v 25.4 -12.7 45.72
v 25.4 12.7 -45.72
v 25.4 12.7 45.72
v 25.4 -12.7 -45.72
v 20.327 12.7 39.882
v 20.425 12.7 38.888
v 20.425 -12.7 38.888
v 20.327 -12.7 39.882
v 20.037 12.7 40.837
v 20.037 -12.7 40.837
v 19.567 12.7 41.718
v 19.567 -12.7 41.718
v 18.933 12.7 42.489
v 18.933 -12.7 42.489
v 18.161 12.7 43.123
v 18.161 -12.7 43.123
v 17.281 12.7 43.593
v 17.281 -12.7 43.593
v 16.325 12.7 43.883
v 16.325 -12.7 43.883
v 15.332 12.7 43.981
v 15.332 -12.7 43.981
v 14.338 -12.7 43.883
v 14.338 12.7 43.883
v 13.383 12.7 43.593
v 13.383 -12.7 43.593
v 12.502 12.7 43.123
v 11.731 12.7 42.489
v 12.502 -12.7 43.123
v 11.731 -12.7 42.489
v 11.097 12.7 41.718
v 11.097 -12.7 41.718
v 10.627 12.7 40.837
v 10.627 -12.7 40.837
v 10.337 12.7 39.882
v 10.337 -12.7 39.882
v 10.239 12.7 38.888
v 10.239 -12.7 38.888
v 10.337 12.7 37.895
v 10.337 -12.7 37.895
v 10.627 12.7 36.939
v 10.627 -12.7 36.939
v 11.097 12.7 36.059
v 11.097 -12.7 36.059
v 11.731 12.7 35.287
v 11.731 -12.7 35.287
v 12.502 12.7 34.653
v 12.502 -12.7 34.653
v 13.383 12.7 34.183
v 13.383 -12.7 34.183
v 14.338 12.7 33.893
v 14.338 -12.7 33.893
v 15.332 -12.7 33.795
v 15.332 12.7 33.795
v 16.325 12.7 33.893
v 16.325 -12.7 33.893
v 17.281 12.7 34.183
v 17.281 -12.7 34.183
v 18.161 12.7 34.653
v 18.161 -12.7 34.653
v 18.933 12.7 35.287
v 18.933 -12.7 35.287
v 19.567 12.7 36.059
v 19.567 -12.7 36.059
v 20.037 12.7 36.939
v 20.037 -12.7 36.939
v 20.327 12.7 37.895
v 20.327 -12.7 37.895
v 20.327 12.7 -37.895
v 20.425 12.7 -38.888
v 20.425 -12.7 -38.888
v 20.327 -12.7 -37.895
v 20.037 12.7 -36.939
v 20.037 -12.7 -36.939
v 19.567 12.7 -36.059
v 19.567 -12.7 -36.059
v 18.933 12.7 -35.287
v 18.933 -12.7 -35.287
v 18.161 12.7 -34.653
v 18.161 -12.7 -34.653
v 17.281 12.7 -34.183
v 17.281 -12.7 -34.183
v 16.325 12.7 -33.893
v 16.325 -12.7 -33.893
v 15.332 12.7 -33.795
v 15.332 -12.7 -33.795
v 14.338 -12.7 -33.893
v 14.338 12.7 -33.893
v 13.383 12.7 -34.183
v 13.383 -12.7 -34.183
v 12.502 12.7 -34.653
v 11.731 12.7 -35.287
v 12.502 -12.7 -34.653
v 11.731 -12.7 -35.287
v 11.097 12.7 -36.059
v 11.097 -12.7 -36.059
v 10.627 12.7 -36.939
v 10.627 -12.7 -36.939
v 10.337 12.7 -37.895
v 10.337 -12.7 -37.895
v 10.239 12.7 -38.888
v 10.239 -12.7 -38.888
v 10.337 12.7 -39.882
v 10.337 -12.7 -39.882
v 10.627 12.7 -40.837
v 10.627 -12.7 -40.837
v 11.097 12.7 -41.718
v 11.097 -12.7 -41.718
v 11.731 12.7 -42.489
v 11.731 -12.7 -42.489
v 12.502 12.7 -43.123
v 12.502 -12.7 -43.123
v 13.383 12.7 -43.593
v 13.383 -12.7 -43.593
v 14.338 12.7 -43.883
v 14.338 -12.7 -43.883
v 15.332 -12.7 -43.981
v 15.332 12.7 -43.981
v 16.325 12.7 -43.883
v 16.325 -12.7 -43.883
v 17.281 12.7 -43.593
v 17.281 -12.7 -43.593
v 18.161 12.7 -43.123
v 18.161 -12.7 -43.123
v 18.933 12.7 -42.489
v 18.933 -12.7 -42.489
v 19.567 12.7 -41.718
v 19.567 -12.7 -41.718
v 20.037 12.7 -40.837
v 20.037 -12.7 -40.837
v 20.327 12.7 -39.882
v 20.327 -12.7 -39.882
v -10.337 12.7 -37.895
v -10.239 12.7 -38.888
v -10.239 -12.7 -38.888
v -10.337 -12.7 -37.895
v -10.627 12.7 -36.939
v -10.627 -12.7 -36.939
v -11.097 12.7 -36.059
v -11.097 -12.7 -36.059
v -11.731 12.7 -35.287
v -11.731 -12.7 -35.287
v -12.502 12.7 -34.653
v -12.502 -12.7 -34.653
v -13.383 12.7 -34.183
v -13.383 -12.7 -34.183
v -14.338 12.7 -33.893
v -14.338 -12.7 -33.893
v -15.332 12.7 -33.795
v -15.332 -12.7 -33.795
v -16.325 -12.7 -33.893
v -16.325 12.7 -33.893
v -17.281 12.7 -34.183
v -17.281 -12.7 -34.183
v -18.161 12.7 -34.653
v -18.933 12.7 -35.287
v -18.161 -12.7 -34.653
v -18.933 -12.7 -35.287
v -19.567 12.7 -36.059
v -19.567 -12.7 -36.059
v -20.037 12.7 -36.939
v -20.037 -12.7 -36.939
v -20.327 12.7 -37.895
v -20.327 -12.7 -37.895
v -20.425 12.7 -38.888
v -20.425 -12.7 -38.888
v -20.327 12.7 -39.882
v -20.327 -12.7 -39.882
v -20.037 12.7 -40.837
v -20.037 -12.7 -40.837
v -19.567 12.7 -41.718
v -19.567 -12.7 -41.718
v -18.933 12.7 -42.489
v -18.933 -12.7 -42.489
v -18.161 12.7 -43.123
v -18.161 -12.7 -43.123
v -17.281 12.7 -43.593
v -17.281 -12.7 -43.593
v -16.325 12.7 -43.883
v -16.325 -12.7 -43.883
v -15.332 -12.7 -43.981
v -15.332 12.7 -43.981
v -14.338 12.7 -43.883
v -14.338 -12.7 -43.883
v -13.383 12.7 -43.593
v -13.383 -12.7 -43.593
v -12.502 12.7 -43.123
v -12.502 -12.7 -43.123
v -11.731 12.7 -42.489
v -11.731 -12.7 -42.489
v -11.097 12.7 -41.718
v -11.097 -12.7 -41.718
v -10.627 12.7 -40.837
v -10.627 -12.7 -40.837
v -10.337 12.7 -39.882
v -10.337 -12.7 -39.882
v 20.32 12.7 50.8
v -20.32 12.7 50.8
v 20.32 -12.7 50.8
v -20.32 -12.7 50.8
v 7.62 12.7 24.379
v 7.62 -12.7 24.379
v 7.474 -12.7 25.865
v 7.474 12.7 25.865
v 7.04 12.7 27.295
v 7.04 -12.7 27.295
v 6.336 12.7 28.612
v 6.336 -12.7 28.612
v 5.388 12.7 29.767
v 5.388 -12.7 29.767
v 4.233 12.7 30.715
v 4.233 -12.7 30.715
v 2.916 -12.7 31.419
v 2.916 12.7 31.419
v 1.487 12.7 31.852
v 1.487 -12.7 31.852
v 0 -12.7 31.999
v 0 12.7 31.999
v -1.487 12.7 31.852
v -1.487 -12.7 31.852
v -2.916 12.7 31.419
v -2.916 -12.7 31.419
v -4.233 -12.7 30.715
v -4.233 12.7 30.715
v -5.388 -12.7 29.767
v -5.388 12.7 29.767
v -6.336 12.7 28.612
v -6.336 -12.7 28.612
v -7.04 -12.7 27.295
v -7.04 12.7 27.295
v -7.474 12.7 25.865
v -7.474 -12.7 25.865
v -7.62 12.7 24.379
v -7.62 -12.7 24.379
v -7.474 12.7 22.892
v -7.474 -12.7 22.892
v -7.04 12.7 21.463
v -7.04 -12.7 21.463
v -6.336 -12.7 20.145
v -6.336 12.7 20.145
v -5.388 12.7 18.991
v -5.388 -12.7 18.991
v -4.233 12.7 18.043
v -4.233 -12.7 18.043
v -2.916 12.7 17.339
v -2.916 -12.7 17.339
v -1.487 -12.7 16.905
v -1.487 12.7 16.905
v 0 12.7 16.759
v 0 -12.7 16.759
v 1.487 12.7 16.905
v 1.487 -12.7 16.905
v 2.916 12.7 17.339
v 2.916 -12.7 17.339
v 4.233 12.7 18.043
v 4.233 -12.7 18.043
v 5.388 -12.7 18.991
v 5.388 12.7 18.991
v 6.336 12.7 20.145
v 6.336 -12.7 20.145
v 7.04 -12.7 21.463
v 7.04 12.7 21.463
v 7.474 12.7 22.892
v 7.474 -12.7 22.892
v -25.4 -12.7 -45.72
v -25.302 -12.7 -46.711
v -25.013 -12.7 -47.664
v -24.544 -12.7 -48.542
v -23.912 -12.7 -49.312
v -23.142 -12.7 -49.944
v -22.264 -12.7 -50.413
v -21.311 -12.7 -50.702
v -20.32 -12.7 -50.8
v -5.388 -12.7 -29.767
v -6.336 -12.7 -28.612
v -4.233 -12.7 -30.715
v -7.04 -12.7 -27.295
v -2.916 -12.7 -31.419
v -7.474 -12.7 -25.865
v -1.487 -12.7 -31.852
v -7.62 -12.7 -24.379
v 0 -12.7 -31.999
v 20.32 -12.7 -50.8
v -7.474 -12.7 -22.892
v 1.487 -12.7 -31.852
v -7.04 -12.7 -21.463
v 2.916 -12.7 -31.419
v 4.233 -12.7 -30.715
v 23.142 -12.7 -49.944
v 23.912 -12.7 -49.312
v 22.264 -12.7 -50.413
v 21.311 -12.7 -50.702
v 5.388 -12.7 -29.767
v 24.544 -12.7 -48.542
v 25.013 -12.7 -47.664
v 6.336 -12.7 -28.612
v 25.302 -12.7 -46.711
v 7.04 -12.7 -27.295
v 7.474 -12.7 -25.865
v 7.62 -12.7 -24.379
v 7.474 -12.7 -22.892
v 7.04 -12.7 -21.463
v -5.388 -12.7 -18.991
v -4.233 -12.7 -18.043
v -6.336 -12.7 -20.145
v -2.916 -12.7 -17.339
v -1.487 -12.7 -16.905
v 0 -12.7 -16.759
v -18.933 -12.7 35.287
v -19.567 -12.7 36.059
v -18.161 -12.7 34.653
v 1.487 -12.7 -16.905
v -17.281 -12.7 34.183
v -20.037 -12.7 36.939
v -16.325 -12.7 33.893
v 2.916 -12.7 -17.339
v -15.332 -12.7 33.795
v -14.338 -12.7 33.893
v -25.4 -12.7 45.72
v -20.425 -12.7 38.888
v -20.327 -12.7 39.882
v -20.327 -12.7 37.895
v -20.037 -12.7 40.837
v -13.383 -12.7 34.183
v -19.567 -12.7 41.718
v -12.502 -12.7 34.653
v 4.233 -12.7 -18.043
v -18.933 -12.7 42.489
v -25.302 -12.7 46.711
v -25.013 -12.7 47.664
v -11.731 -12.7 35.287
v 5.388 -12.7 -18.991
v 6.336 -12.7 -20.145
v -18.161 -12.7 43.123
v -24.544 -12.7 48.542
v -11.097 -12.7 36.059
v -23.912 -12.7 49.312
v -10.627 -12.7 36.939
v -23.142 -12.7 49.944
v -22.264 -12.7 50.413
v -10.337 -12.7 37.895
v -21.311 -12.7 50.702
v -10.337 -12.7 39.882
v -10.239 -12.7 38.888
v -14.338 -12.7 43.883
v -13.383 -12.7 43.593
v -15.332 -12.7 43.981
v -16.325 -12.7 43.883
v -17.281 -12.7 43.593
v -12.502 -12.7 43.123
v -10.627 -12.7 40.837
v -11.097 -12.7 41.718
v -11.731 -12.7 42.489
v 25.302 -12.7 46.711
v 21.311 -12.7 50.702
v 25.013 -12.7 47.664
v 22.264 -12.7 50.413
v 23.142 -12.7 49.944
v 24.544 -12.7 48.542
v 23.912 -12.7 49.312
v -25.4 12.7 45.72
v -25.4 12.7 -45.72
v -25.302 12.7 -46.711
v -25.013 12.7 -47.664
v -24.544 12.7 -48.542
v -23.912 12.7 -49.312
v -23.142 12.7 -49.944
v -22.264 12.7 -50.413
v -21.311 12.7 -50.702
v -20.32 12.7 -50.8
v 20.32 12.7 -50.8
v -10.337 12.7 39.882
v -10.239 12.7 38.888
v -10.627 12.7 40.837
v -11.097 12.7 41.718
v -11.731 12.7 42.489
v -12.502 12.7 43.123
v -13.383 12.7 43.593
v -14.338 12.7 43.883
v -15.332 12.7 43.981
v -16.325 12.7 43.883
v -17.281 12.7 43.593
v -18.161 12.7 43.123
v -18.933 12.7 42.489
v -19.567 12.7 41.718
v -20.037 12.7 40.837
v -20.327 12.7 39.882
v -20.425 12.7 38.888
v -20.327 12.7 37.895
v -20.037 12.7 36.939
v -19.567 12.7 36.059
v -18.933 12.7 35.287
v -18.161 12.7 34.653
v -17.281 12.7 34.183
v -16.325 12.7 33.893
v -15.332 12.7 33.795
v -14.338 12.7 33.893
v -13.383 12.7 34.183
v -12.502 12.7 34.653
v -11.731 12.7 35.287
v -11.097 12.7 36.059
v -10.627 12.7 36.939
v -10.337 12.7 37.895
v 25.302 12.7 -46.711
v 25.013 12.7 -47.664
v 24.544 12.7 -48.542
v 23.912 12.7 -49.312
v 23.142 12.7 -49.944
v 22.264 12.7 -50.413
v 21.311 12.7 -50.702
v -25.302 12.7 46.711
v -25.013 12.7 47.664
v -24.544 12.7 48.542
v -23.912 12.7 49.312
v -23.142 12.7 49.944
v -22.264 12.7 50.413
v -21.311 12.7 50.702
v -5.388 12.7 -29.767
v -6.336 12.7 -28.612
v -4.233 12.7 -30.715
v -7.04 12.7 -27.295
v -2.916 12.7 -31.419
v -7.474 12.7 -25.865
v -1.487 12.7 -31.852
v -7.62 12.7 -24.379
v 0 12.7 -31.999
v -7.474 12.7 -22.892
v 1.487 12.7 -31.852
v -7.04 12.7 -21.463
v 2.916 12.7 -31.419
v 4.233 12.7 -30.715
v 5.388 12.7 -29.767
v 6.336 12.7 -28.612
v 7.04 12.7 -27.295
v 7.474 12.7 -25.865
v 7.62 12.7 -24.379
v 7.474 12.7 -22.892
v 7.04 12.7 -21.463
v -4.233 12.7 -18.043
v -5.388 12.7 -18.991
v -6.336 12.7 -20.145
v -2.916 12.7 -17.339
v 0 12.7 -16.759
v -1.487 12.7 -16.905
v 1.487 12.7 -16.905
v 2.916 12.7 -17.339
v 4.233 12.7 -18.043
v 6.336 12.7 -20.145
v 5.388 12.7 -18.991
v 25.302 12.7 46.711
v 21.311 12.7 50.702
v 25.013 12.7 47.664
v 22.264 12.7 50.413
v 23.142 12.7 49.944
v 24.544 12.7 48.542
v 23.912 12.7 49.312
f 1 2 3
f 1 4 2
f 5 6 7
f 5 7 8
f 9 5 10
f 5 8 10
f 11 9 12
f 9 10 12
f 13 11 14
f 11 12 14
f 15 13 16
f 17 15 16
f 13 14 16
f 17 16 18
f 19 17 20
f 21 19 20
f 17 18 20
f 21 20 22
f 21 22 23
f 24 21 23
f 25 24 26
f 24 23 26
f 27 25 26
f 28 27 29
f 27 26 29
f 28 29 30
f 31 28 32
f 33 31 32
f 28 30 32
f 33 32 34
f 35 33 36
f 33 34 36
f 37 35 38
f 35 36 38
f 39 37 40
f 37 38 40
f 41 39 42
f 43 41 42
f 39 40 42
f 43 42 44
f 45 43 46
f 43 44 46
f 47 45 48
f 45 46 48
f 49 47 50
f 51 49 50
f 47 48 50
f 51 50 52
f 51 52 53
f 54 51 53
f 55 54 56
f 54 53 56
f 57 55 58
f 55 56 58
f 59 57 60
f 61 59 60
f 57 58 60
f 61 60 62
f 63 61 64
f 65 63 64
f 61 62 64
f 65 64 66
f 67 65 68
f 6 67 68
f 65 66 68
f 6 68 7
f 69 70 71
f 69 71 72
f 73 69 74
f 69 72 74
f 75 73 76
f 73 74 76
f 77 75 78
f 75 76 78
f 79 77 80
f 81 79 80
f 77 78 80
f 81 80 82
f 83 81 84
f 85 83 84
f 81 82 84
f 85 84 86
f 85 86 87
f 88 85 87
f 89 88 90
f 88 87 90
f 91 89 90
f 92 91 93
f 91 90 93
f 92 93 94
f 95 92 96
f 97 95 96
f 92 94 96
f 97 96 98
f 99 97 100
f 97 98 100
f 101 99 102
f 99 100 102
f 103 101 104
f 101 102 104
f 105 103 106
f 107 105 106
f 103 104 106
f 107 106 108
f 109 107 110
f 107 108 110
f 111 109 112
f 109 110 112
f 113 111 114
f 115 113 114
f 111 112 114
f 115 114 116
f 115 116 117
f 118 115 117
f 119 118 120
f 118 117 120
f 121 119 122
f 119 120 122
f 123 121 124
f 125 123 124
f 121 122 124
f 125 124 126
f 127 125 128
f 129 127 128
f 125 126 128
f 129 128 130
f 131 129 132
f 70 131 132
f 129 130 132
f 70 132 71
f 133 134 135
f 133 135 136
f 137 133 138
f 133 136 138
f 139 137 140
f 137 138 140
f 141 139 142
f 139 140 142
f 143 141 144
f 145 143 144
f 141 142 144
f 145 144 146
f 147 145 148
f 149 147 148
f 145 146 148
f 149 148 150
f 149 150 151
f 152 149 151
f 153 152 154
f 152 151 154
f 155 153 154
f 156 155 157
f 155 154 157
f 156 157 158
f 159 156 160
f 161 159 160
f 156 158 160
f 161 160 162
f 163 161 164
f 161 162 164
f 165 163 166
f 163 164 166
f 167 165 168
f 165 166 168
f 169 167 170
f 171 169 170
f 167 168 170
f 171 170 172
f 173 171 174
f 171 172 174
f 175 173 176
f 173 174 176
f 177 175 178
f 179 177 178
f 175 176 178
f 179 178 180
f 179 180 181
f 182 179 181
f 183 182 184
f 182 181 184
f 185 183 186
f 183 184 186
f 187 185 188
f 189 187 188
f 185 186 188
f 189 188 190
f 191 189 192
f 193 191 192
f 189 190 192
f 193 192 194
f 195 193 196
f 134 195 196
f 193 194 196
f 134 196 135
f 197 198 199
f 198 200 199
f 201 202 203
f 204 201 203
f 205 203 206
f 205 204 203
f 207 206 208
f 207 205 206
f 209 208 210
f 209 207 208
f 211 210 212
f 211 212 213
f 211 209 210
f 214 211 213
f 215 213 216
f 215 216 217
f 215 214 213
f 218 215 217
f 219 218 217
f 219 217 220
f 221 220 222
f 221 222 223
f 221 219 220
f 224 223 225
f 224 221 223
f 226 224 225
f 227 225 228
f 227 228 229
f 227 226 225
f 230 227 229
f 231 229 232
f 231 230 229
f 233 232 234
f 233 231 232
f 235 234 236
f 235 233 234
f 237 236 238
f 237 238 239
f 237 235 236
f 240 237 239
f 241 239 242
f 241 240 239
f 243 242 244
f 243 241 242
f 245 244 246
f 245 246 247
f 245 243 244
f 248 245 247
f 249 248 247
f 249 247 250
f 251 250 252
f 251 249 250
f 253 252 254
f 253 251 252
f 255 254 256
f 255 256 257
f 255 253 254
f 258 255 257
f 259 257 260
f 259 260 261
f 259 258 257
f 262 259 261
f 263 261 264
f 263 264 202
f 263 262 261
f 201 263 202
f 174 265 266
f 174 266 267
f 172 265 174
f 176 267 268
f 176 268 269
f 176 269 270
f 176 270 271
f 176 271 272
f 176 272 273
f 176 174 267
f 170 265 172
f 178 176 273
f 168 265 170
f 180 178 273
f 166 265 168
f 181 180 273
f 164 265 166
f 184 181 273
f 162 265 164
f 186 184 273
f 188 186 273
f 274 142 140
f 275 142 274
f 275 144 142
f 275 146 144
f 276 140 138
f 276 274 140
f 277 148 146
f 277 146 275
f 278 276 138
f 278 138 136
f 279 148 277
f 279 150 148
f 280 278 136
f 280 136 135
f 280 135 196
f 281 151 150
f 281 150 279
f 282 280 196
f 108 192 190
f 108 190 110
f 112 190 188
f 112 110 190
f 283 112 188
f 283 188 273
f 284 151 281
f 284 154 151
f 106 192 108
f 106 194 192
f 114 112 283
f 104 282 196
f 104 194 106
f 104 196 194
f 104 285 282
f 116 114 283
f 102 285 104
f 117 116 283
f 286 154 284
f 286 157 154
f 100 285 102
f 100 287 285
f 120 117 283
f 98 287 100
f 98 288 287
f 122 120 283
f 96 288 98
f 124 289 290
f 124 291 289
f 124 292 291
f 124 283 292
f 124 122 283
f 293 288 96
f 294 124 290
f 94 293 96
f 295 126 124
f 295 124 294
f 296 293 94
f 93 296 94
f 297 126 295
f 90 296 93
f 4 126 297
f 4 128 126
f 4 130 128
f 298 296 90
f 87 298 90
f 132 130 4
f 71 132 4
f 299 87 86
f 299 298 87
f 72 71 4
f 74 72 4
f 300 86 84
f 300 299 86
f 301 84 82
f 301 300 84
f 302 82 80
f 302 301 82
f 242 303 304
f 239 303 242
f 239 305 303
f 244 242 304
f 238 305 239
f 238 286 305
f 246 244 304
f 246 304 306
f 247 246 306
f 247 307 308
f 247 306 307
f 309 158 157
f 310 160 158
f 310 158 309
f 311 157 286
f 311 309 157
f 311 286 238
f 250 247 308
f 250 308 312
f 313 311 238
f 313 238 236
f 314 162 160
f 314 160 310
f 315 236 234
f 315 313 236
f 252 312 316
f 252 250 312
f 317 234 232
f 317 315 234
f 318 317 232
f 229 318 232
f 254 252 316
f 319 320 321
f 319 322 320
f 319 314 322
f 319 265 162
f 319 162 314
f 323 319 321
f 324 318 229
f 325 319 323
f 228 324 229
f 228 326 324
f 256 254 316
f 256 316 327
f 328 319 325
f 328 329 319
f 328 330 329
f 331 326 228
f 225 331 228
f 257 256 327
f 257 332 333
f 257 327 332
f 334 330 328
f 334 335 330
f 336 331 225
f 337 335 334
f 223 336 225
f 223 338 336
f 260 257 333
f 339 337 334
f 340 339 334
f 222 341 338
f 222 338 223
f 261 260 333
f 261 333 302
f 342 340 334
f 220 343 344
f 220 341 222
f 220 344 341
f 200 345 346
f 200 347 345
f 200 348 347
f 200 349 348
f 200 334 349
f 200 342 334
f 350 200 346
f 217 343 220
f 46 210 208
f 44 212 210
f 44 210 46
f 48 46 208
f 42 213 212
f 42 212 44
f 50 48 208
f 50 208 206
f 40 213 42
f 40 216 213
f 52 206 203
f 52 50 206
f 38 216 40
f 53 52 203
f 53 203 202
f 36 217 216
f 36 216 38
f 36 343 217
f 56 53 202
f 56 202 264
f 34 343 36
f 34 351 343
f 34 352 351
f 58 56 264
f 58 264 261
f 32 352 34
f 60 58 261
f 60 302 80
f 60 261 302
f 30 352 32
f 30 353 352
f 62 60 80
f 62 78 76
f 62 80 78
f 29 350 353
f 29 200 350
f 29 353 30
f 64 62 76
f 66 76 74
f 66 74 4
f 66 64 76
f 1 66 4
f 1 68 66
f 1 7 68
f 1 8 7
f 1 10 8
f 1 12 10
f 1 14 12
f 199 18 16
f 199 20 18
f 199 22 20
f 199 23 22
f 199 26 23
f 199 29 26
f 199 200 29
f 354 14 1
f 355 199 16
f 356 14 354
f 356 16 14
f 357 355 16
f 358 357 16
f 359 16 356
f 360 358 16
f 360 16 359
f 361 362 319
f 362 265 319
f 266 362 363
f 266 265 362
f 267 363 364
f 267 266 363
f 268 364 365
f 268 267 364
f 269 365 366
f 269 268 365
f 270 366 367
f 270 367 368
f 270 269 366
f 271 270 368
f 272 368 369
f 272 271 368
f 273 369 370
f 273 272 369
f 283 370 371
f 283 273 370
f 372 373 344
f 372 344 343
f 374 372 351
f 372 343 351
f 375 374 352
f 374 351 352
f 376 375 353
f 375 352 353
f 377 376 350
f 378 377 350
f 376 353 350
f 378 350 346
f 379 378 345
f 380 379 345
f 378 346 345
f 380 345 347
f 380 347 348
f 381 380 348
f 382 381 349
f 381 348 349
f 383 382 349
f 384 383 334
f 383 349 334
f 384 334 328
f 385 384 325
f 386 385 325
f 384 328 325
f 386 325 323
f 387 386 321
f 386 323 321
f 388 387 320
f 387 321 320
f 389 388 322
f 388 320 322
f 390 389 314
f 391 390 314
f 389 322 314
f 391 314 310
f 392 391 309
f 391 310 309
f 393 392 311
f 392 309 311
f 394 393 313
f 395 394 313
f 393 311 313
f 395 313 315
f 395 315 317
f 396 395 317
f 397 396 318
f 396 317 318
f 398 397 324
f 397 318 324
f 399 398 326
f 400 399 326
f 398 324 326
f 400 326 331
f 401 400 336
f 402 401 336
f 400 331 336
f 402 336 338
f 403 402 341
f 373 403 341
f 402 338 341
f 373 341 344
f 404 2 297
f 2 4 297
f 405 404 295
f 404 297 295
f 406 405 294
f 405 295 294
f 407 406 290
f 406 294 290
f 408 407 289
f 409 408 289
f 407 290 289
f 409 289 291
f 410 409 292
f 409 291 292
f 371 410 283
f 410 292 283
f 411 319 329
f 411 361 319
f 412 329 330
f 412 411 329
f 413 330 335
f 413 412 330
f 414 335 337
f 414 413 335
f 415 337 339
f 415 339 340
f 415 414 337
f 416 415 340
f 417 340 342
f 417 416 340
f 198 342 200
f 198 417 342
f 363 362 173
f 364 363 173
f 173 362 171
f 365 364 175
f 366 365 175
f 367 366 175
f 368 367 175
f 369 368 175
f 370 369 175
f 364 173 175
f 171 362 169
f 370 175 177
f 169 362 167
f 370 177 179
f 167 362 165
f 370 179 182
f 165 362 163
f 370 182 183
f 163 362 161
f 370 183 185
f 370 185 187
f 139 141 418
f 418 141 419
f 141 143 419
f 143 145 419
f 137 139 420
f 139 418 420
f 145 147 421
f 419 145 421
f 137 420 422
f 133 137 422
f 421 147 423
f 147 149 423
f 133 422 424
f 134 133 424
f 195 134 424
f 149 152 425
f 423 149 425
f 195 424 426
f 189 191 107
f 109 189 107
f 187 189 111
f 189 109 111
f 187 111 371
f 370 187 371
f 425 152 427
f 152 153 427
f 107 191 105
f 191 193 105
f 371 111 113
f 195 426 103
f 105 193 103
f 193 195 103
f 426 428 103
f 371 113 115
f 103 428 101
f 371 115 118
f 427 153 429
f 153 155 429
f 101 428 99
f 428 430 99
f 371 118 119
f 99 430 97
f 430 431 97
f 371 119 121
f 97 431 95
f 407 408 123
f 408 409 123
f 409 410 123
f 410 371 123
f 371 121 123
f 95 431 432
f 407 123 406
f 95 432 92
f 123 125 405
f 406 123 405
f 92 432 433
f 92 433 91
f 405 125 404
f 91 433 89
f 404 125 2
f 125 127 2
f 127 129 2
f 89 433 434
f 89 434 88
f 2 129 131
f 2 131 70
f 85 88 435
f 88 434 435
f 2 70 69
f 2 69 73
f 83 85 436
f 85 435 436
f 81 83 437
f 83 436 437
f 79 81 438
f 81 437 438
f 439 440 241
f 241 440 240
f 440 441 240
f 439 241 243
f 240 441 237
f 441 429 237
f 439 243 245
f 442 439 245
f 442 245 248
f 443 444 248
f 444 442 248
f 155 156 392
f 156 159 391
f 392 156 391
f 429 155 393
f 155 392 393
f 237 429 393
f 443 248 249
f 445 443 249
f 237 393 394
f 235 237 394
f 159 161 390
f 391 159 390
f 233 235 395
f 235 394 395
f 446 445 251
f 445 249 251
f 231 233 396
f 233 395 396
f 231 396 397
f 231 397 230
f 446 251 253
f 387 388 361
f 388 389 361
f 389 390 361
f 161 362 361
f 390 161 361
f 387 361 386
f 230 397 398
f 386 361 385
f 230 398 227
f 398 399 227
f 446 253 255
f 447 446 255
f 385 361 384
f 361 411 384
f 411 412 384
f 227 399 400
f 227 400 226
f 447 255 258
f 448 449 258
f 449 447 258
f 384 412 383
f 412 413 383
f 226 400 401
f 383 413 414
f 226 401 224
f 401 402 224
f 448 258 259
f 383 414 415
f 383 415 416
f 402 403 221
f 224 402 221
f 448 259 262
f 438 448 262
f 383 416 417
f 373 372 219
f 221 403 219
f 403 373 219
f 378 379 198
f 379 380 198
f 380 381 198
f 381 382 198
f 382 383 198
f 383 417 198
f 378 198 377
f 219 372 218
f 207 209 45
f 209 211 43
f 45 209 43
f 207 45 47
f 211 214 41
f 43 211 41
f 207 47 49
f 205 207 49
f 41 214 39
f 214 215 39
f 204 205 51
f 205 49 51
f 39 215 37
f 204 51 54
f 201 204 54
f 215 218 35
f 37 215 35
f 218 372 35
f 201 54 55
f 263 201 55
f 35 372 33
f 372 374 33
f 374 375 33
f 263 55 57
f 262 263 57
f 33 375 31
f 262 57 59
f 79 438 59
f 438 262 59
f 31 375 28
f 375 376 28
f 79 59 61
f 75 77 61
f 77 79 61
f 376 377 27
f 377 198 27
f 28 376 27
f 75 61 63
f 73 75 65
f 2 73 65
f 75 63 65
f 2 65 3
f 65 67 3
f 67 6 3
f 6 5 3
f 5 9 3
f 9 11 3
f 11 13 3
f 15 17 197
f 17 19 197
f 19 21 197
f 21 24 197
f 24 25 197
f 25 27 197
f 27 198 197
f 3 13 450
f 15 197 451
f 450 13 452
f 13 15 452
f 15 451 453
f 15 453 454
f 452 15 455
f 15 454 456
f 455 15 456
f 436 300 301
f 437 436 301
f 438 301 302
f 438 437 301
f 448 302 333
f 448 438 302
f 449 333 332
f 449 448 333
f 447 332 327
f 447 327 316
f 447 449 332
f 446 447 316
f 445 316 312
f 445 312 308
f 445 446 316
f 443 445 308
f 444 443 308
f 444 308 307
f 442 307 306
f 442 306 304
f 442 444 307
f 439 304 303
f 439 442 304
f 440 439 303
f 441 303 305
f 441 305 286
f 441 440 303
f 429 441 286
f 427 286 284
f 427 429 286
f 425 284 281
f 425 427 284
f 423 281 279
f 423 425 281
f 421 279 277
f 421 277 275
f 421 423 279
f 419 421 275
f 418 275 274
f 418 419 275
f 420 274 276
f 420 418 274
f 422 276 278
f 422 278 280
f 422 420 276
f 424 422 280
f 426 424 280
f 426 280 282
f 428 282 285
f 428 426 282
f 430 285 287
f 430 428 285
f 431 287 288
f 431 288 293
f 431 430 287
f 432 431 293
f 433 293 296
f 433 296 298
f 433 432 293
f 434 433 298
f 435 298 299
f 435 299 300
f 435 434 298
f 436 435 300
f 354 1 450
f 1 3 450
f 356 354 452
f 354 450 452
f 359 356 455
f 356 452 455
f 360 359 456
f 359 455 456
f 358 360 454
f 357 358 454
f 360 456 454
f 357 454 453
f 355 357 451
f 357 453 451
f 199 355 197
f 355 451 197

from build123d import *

# Parameters (mm, degrees)
F0_W     = 50.8
F0_H     = 101.6
F0_R     = 7.62
F1_DEPTH = 12.7
F2_R     = 5.08
F3_R     = 5.092996
F4_DEPTH = 25.4


with BuildPart() as f1:
    # F0 (on Front) → F1 (new body, symmetric)
    with BuildSketch(Plane.XZ):
        Rectangle(F0_W, F0_H)
        with Locations((0, -24.378773)):
            Circle(F0_R, mode=Mode.SUBTRACT)
        with Locations((0, 24.378773)):
            Circle(F0_R, mode=Mode.SUBTRACT)
    extrude(amount=F1_DEPTH, both=True)

    # F2
    f2_edges = [f1.edges().sort_by_distance(p)[0] for p in [
        (25.4, 0, 50.8),
        (-25.4, 0, 50.8),
        (25.4, 0, -50.8),
        (-25.4, 0, -50.8),
    ]]
    fillet(f2_edges, radius=F2_R)

    # F3 (on face) → F4 (cut, through all)
    with BuildSketch(Plane.XZ.offset(12.7)):
        with Locations((-15.331865, 38.888112)):
            Circle(F3_R)
        with Locations((15.331865, 38.888112)):
            Circle(F3_R)
        with Locations((15.331865, -38.888112)):
            Circle(F3_R)
        with Locations((-15.331865, -38.888112)):
            Circle(F3_R)
    extrude(amount=-F4_DEPTH, mode=Mode.SUBTRACT)


solid = f1.part
